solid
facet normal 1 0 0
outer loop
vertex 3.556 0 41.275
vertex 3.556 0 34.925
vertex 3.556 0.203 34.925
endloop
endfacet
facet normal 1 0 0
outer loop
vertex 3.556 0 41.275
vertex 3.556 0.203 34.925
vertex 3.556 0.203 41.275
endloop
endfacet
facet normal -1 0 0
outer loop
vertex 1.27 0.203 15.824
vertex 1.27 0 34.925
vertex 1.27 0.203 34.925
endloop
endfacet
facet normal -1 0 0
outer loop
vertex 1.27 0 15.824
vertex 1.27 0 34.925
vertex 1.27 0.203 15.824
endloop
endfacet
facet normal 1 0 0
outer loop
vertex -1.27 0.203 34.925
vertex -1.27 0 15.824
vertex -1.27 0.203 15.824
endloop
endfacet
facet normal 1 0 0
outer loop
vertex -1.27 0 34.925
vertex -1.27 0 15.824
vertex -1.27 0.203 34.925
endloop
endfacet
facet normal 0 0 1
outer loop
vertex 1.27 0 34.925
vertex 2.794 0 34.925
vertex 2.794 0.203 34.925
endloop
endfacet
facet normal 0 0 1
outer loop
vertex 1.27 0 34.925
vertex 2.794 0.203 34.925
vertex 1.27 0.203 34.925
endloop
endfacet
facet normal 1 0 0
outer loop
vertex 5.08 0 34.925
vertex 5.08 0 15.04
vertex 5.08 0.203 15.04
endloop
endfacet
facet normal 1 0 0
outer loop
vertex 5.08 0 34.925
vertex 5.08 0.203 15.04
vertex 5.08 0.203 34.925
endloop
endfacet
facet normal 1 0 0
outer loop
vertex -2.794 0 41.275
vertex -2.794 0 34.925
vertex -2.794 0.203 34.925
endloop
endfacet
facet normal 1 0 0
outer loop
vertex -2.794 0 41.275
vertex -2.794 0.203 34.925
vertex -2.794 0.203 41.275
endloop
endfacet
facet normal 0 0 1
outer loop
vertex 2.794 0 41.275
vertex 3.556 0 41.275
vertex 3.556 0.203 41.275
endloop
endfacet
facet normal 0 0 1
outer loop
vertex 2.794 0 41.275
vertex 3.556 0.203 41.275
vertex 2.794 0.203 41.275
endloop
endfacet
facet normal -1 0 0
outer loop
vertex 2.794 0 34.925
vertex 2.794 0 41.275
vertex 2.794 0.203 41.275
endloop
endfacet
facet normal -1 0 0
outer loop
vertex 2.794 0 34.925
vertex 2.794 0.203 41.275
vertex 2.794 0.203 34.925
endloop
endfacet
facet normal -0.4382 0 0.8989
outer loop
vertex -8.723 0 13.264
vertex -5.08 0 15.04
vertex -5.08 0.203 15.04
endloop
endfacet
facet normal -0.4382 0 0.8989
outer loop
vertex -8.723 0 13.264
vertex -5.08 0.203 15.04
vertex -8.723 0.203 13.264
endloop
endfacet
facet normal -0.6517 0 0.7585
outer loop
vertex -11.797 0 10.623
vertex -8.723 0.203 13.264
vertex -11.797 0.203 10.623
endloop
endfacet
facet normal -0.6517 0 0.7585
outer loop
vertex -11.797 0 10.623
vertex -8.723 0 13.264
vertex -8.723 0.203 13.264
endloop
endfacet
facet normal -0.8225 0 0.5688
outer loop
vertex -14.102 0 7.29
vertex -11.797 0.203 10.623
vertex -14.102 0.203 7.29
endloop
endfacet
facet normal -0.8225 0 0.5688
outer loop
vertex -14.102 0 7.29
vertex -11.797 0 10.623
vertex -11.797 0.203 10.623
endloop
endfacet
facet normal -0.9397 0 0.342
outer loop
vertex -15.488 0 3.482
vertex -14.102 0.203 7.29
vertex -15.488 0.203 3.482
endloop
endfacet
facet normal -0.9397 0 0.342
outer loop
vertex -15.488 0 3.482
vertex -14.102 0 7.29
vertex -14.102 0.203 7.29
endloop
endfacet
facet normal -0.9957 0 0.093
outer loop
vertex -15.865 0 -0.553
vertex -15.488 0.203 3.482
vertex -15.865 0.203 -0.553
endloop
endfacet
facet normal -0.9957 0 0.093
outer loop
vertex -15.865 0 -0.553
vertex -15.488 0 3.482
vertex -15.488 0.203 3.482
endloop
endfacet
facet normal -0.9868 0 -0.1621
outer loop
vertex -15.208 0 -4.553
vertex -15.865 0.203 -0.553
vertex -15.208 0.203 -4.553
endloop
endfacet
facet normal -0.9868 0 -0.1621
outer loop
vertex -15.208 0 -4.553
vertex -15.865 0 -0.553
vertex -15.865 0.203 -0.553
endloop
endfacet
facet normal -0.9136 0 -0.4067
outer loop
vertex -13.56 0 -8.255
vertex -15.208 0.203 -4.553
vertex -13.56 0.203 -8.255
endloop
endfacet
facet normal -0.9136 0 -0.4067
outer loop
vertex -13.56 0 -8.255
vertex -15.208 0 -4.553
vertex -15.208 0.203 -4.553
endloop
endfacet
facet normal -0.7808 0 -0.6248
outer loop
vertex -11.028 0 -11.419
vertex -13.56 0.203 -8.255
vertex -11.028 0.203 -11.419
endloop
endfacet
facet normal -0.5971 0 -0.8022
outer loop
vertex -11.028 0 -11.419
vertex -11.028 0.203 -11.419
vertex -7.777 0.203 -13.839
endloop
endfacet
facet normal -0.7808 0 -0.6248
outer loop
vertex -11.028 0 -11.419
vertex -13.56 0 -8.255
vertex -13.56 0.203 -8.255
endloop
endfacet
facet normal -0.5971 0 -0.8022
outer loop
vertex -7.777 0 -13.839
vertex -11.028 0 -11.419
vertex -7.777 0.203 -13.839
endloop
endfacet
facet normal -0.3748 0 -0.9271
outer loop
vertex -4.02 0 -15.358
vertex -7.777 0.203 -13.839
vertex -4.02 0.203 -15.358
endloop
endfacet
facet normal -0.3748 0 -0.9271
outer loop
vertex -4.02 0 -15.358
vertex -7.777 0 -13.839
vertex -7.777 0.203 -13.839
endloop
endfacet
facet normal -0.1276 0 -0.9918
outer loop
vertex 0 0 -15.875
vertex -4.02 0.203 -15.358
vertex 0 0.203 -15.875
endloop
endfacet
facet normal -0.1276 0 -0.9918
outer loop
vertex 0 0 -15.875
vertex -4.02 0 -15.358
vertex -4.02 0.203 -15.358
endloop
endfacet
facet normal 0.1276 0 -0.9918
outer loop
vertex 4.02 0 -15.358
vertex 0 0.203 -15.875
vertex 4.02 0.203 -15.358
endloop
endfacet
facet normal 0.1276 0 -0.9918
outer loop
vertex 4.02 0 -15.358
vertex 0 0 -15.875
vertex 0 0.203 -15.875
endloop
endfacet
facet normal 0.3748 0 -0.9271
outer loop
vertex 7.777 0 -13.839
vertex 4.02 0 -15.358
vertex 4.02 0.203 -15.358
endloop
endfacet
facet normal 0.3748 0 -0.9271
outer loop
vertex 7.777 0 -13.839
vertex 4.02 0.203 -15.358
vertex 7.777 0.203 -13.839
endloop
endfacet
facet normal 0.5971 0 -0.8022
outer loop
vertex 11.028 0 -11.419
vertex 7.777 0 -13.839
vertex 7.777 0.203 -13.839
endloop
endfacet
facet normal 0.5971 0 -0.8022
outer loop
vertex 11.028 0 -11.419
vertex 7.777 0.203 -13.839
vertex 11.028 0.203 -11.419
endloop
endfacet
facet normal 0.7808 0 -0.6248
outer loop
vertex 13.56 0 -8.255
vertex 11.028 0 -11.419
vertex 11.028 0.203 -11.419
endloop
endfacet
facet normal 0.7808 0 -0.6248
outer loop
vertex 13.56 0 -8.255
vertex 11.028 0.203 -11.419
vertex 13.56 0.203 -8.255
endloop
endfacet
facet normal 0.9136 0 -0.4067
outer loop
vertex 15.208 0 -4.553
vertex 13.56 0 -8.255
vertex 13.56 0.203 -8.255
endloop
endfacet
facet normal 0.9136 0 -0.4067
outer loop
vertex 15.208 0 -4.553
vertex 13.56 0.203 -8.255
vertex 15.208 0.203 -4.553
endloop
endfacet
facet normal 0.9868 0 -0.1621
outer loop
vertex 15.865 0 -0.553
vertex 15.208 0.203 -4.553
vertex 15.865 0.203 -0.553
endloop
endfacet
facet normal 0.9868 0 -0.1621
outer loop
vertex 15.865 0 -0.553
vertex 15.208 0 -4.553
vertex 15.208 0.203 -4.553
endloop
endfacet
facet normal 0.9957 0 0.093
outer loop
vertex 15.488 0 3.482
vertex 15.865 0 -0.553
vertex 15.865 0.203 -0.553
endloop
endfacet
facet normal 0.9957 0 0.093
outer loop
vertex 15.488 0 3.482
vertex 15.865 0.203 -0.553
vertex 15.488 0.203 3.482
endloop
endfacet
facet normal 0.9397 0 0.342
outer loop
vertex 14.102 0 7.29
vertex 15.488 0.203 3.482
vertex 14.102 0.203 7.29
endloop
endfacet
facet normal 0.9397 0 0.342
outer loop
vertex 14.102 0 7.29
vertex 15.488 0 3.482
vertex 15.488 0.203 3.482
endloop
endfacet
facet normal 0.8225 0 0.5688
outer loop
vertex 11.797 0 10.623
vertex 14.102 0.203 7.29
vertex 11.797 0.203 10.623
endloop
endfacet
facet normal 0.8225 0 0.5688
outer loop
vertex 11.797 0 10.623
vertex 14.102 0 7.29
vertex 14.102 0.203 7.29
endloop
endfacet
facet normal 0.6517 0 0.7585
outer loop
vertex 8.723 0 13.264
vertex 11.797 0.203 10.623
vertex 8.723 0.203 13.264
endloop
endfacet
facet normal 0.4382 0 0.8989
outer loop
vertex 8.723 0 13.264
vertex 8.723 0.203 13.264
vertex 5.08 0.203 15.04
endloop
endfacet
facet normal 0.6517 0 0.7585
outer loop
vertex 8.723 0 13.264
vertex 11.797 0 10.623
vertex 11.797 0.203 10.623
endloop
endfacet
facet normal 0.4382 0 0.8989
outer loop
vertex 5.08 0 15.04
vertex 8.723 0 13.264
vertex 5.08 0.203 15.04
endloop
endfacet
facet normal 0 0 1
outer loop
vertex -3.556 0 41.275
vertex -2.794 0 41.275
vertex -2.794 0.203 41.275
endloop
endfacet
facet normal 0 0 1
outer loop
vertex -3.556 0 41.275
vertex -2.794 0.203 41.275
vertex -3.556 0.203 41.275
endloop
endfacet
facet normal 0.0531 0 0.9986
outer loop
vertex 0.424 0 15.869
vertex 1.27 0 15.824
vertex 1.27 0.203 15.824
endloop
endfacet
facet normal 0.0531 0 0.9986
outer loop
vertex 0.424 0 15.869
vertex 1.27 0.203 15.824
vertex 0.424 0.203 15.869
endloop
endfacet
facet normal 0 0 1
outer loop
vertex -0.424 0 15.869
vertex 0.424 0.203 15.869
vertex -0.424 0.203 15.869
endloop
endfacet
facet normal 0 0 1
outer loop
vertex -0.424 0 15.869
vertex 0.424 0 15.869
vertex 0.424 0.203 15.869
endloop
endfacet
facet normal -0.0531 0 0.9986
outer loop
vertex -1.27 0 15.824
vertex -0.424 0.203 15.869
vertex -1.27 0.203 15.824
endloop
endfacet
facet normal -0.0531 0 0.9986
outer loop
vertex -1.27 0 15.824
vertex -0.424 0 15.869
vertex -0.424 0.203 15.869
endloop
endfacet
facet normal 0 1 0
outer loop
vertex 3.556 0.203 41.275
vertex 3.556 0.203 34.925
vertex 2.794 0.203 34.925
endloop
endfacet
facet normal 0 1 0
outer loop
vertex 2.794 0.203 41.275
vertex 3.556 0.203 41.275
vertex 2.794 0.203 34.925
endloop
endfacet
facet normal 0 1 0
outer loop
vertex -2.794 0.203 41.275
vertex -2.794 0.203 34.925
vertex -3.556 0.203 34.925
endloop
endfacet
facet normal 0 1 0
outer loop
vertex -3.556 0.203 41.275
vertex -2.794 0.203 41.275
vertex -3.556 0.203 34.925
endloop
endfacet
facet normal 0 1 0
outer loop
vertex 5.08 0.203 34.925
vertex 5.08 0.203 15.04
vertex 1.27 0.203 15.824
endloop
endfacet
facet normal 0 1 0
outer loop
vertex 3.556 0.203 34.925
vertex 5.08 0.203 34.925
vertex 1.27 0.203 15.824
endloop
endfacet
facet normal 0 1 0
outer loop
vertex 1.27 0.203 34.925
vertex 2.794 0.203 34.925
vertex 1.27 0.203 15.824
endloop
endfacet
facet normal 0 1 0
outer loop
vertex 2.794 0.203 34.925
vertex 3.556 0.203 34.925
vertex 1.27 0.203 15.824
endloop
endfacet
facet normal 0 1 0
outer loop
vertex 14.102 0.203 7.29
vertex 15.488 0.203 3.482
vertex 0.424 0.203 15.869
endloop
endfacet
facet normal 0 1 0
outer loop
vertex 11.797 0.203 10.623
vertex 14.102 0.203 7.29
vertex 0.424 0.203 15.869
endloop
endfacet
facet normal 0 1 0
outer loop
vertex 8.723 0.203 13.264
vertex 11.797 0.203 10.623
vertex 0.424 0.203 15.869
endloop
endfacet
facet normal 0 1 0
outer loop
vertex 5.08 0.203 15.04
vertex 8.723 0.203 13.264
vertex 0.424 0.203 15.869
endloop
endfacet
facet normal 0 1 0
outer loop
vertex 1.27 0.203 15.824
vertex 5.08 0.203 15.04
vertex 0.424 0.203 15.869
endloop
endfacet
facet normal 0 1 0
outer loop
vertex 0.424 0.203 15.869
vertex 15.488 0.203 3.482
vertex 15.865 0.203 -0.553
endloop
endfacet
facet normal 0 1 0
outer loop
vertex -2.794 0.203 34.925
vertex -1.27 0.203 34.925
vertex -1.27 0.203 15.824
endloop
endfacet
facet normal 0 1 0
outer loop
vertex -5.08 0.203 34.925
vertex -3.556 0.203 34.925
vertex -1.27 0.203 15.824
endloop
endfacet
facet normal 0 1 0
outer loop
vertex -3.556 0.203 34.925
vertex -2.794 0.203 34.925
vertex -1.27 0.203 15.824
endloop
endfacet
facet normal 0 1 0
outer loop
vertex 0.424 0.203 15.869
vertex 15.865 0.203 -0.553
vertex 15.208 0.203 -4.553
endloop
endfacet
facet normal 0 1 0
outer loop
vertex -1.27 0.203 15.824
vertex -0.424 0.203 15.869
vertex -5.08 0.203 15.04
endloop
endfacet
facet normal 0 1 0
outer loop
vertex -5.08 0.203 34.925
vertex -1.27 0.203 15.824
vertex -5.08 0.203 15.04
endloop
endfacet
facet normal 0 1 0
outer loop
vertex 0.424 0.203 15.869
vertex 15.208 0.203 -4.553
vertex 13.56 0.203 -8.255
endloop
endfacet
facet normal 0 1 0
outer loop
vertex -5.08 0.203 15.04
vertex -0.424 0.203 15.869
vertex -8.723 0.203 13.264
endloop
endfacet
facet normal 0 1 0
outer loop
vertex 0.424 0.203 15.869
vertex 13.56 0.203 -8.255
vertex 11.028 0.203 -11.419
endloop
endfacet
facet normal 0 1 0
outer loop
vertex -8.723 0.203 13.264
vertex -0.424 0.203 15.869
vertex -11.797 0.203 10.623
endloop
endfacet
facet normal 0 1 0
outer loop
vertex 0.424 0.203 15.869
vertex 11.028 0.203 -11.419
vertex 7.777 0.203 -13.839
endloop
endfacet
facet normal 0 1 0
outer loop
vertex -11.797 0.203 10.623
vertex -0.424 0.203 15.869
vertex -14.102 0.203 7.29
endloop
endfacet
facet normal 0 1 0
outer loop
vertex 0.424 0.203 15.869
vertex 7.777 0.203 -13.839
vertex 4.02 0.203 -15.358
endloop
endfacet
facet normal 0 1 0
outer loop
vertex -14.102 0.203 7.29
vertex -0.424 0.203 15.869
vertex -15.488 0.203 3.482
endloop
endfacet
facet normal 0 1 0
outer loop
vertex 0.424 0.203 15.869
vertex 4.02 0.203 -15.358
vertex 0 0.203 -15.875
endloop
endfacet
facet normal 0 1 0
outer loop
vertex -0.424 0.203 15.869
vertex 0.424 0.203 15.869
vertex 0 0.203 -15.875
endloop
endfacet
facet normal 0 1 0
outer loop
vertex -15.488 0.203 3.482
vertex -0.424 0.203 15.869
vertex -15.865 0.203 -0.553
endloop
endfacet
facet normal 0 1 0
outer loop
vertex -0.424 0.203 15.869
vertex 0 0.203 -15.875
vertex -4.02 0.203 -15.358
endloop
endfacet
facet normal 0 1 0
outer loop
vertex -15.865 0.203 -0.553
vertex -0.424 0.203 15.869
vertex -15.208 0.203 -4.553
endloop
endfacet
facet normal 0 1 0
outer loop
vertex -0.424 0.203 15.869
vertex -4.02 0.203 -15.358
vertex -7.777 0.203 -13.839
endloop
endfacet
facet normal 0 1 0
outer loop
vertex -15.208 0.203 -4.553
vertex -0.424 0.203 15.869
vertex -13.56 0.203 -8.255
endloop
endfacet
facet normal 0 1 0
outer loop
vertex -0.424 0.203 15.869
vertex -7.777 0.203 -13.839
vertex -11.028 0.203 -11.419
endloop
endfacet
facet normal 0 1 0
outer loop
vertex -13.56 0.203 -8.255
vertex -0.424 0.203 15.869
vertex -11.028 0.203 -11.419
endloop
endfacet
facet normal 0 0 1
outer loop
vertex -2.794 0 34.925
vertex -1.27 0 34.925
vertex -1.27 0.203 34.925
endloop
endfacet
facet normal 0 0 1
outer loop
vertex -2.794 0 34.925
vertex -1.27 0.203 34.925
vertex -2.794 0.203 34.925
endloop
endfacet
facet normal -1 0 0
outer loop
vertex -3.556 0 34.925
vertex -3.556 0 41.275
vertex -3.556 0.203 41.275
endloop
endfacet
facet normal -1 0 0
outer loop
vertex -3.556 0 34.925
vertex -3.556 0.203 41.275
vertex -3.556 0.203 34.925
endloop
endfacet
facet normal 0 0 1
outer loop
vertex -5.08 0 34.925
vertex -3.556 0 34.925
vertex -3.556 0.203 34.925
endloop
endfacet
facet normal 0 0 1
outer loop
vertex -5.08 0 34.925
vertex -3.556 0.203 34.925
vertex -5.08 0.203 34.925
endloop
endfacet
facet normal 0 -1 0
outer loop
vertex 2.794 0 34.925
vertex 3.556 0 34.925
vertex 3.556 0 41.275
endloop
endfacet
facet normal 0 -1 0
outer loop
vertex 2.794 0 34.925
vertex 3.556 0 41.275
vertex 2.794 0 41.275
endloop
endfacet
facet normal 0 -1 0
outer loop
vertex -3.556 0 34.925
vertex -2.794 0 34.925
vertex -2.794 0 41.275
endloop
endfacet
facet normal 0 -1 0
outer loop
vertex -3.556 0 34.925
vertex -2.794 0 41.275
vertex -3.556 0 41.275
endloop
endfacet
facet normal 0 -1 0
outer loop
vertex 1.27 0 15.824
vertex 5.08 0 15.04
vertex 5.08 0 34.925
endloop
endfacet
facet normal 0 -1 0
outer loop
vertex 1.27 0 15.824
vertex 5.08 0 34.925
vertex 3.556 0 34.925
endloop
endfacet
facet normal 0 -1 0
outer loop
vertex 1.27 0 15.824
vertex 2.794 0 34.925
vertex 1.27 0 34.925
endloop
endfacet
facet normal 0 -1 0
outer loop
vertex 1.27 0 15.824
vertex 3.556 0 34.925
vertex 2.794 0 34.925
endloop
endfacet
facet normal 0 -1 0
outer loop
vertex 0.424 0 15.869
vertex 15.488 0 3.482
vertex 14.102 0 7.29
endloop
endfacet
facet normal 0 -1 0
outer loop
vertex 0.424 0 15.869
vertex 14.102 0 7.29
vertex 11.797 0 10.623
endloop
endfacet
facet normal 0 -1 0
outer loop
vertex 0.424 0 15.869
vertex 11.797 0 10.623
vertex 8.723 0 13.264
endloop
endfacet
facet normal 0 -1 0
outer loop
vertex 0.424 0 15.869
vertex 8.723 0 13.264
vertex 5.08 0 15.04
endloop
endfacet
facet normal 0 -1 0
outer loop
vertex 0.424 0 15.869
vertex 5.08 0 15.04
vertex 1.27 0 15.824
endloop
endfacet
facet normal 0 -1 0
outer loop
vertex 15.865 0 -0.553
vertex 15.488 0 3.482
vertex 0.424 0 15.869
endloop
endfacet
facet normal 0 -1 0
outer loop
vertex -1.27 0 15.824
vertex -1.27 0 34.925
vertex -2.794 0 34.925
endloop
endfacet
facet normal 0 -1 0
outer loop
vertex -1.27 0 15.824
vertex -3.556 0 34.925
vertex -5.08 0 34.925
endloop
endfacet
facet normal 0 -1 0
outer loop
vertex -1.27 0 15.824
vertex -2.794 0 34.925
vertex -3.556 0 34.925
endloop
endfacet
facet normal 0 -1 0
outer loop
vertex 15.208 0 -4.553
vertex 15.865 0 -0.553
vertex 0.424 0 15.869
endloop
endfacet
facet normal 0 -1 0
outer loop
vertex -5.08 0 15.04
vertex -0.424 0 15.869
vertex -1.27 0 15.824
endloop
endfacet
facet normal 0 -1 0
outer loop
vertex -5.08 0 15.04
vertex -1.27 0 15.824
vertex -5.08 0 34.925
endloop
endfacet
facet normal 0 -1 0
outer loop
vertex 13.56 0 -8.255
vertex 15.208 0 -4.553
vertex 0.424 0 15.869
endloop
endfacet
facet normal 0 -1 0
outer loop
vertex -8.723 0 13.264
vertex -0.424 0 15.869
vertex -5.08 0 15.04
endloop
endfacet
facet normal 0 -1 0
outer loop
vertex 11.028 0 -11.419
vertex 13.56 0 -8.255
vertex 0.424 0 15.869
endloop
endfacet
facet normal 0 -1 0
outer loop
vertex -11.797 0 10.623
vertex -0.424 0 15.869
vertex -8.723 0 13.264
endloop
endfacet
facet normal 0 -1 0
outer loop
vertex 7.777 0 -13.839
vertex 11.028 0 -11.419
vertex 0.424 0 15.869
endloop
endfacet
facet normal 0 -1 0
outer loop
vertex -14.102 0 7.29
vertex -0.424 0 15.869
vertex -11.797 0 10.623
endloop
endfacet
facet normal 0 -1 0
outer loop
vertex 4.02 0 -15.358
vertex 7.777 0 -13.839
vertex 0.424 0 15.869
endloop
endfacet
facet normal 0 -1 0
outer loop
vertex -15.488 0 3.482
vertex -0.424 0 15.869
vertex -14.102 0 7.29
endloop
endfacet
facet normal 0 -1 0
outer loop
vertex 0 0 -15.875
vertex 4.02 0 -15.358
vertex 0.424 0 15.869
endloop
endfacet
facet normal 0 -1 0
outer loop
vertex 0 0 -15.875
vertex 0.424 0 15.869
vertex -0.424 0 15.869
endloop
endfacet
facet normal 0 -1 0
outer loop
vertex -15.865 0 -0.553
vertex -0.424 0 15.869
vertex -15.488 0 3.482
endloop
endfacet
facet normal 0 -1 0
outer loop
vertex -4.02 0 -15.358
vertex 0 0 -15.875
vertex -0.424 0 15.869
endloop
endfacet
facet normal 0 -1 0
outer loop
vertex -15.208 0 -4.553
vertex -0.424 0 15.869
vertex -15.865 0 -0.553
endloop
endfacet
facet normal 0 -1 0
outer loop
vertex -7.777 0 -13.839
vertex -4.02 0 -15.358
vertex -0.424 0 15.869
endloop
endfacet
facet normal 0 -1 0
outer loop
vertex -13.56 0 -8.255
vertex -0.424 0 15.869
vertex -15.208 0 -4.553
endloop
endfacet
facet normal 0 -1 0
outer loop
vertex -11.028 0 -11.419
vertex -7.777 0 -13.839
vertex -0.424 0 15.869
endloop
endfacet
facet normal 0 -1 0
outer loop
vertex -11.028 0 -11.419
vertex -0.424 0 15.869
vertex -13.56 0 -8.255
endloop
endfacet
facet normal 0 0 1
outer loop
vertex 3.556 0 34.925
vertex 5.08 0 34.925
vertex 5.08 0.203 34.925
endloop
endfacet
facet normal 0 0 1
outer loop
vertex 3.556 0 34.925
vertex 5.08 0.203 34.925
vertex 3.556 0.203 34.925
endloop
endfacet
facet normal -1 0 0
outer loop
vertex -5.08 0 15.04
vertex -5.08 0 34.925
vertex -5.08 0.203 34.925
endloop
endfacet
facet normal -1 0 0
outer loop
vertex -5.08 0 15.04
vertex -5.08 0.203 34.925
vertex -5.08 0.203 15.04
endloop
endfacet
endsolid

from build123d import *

# Parameters (mm, degrees)
BOSS_EXTRUDE1_DEPTH = 0.2032


with BuildPart() as part:
    # Sketch1 → Boss-Extrude1 (new body)
    with BuildSketch(Plane(origin=(0, 0, 0), x_dir=(1, 0, 0), z_dir=(0, 1, 0))):
        with BuildLine():
            Line((-1.27, -15.824118459), (-1.27, -34.925))
            Line((-1.27, -34.925), (-2.794, -34.925))
            Line((-2.794, -34.925), (-2.794, -41.275))
            Line((-2.794, -41.275), (-3.556, -41.275))
            Line((-3.556, -41.275), (-3.556, -34.925))
            Line((-3.556, -34.925), (-5.08, -34.925))
            Line((-5.08, -34.925), (-5.08, -15.294253489))
            Line((-5.08, -15.294253489), (-5.08, -15.040253489))
            ThreePointArc((-5.08, -15.040253489), (0, 15.875), (5.08, -15.040253489))
            Line((5.08, -15.040253489), (5.08, -15.294253489))
            Line((5.08, -15.294253489), (5.08, -34.925))
            Line((5.08, -34.925), (3.556, -34.925))
            Line((3.556, -34.925), (3.556, -41.275))
            Line((3.556, -41.275), (2.794, -41.275))
            Line((2.794, -41.275), (2.794, -34.925))
            Line((2.794, -34.925), (1.27, -34.925))
            Line((1.27, -34.925), (1.27, -15.824118459))
            ThreePointArc((1.27, -15.824118459), (0, -15.875), (-1.27, -15.824118459))
        make_face()
    extrude(amount=BOSS_EXTRUDE1_DEPTH)


solid = part.part
